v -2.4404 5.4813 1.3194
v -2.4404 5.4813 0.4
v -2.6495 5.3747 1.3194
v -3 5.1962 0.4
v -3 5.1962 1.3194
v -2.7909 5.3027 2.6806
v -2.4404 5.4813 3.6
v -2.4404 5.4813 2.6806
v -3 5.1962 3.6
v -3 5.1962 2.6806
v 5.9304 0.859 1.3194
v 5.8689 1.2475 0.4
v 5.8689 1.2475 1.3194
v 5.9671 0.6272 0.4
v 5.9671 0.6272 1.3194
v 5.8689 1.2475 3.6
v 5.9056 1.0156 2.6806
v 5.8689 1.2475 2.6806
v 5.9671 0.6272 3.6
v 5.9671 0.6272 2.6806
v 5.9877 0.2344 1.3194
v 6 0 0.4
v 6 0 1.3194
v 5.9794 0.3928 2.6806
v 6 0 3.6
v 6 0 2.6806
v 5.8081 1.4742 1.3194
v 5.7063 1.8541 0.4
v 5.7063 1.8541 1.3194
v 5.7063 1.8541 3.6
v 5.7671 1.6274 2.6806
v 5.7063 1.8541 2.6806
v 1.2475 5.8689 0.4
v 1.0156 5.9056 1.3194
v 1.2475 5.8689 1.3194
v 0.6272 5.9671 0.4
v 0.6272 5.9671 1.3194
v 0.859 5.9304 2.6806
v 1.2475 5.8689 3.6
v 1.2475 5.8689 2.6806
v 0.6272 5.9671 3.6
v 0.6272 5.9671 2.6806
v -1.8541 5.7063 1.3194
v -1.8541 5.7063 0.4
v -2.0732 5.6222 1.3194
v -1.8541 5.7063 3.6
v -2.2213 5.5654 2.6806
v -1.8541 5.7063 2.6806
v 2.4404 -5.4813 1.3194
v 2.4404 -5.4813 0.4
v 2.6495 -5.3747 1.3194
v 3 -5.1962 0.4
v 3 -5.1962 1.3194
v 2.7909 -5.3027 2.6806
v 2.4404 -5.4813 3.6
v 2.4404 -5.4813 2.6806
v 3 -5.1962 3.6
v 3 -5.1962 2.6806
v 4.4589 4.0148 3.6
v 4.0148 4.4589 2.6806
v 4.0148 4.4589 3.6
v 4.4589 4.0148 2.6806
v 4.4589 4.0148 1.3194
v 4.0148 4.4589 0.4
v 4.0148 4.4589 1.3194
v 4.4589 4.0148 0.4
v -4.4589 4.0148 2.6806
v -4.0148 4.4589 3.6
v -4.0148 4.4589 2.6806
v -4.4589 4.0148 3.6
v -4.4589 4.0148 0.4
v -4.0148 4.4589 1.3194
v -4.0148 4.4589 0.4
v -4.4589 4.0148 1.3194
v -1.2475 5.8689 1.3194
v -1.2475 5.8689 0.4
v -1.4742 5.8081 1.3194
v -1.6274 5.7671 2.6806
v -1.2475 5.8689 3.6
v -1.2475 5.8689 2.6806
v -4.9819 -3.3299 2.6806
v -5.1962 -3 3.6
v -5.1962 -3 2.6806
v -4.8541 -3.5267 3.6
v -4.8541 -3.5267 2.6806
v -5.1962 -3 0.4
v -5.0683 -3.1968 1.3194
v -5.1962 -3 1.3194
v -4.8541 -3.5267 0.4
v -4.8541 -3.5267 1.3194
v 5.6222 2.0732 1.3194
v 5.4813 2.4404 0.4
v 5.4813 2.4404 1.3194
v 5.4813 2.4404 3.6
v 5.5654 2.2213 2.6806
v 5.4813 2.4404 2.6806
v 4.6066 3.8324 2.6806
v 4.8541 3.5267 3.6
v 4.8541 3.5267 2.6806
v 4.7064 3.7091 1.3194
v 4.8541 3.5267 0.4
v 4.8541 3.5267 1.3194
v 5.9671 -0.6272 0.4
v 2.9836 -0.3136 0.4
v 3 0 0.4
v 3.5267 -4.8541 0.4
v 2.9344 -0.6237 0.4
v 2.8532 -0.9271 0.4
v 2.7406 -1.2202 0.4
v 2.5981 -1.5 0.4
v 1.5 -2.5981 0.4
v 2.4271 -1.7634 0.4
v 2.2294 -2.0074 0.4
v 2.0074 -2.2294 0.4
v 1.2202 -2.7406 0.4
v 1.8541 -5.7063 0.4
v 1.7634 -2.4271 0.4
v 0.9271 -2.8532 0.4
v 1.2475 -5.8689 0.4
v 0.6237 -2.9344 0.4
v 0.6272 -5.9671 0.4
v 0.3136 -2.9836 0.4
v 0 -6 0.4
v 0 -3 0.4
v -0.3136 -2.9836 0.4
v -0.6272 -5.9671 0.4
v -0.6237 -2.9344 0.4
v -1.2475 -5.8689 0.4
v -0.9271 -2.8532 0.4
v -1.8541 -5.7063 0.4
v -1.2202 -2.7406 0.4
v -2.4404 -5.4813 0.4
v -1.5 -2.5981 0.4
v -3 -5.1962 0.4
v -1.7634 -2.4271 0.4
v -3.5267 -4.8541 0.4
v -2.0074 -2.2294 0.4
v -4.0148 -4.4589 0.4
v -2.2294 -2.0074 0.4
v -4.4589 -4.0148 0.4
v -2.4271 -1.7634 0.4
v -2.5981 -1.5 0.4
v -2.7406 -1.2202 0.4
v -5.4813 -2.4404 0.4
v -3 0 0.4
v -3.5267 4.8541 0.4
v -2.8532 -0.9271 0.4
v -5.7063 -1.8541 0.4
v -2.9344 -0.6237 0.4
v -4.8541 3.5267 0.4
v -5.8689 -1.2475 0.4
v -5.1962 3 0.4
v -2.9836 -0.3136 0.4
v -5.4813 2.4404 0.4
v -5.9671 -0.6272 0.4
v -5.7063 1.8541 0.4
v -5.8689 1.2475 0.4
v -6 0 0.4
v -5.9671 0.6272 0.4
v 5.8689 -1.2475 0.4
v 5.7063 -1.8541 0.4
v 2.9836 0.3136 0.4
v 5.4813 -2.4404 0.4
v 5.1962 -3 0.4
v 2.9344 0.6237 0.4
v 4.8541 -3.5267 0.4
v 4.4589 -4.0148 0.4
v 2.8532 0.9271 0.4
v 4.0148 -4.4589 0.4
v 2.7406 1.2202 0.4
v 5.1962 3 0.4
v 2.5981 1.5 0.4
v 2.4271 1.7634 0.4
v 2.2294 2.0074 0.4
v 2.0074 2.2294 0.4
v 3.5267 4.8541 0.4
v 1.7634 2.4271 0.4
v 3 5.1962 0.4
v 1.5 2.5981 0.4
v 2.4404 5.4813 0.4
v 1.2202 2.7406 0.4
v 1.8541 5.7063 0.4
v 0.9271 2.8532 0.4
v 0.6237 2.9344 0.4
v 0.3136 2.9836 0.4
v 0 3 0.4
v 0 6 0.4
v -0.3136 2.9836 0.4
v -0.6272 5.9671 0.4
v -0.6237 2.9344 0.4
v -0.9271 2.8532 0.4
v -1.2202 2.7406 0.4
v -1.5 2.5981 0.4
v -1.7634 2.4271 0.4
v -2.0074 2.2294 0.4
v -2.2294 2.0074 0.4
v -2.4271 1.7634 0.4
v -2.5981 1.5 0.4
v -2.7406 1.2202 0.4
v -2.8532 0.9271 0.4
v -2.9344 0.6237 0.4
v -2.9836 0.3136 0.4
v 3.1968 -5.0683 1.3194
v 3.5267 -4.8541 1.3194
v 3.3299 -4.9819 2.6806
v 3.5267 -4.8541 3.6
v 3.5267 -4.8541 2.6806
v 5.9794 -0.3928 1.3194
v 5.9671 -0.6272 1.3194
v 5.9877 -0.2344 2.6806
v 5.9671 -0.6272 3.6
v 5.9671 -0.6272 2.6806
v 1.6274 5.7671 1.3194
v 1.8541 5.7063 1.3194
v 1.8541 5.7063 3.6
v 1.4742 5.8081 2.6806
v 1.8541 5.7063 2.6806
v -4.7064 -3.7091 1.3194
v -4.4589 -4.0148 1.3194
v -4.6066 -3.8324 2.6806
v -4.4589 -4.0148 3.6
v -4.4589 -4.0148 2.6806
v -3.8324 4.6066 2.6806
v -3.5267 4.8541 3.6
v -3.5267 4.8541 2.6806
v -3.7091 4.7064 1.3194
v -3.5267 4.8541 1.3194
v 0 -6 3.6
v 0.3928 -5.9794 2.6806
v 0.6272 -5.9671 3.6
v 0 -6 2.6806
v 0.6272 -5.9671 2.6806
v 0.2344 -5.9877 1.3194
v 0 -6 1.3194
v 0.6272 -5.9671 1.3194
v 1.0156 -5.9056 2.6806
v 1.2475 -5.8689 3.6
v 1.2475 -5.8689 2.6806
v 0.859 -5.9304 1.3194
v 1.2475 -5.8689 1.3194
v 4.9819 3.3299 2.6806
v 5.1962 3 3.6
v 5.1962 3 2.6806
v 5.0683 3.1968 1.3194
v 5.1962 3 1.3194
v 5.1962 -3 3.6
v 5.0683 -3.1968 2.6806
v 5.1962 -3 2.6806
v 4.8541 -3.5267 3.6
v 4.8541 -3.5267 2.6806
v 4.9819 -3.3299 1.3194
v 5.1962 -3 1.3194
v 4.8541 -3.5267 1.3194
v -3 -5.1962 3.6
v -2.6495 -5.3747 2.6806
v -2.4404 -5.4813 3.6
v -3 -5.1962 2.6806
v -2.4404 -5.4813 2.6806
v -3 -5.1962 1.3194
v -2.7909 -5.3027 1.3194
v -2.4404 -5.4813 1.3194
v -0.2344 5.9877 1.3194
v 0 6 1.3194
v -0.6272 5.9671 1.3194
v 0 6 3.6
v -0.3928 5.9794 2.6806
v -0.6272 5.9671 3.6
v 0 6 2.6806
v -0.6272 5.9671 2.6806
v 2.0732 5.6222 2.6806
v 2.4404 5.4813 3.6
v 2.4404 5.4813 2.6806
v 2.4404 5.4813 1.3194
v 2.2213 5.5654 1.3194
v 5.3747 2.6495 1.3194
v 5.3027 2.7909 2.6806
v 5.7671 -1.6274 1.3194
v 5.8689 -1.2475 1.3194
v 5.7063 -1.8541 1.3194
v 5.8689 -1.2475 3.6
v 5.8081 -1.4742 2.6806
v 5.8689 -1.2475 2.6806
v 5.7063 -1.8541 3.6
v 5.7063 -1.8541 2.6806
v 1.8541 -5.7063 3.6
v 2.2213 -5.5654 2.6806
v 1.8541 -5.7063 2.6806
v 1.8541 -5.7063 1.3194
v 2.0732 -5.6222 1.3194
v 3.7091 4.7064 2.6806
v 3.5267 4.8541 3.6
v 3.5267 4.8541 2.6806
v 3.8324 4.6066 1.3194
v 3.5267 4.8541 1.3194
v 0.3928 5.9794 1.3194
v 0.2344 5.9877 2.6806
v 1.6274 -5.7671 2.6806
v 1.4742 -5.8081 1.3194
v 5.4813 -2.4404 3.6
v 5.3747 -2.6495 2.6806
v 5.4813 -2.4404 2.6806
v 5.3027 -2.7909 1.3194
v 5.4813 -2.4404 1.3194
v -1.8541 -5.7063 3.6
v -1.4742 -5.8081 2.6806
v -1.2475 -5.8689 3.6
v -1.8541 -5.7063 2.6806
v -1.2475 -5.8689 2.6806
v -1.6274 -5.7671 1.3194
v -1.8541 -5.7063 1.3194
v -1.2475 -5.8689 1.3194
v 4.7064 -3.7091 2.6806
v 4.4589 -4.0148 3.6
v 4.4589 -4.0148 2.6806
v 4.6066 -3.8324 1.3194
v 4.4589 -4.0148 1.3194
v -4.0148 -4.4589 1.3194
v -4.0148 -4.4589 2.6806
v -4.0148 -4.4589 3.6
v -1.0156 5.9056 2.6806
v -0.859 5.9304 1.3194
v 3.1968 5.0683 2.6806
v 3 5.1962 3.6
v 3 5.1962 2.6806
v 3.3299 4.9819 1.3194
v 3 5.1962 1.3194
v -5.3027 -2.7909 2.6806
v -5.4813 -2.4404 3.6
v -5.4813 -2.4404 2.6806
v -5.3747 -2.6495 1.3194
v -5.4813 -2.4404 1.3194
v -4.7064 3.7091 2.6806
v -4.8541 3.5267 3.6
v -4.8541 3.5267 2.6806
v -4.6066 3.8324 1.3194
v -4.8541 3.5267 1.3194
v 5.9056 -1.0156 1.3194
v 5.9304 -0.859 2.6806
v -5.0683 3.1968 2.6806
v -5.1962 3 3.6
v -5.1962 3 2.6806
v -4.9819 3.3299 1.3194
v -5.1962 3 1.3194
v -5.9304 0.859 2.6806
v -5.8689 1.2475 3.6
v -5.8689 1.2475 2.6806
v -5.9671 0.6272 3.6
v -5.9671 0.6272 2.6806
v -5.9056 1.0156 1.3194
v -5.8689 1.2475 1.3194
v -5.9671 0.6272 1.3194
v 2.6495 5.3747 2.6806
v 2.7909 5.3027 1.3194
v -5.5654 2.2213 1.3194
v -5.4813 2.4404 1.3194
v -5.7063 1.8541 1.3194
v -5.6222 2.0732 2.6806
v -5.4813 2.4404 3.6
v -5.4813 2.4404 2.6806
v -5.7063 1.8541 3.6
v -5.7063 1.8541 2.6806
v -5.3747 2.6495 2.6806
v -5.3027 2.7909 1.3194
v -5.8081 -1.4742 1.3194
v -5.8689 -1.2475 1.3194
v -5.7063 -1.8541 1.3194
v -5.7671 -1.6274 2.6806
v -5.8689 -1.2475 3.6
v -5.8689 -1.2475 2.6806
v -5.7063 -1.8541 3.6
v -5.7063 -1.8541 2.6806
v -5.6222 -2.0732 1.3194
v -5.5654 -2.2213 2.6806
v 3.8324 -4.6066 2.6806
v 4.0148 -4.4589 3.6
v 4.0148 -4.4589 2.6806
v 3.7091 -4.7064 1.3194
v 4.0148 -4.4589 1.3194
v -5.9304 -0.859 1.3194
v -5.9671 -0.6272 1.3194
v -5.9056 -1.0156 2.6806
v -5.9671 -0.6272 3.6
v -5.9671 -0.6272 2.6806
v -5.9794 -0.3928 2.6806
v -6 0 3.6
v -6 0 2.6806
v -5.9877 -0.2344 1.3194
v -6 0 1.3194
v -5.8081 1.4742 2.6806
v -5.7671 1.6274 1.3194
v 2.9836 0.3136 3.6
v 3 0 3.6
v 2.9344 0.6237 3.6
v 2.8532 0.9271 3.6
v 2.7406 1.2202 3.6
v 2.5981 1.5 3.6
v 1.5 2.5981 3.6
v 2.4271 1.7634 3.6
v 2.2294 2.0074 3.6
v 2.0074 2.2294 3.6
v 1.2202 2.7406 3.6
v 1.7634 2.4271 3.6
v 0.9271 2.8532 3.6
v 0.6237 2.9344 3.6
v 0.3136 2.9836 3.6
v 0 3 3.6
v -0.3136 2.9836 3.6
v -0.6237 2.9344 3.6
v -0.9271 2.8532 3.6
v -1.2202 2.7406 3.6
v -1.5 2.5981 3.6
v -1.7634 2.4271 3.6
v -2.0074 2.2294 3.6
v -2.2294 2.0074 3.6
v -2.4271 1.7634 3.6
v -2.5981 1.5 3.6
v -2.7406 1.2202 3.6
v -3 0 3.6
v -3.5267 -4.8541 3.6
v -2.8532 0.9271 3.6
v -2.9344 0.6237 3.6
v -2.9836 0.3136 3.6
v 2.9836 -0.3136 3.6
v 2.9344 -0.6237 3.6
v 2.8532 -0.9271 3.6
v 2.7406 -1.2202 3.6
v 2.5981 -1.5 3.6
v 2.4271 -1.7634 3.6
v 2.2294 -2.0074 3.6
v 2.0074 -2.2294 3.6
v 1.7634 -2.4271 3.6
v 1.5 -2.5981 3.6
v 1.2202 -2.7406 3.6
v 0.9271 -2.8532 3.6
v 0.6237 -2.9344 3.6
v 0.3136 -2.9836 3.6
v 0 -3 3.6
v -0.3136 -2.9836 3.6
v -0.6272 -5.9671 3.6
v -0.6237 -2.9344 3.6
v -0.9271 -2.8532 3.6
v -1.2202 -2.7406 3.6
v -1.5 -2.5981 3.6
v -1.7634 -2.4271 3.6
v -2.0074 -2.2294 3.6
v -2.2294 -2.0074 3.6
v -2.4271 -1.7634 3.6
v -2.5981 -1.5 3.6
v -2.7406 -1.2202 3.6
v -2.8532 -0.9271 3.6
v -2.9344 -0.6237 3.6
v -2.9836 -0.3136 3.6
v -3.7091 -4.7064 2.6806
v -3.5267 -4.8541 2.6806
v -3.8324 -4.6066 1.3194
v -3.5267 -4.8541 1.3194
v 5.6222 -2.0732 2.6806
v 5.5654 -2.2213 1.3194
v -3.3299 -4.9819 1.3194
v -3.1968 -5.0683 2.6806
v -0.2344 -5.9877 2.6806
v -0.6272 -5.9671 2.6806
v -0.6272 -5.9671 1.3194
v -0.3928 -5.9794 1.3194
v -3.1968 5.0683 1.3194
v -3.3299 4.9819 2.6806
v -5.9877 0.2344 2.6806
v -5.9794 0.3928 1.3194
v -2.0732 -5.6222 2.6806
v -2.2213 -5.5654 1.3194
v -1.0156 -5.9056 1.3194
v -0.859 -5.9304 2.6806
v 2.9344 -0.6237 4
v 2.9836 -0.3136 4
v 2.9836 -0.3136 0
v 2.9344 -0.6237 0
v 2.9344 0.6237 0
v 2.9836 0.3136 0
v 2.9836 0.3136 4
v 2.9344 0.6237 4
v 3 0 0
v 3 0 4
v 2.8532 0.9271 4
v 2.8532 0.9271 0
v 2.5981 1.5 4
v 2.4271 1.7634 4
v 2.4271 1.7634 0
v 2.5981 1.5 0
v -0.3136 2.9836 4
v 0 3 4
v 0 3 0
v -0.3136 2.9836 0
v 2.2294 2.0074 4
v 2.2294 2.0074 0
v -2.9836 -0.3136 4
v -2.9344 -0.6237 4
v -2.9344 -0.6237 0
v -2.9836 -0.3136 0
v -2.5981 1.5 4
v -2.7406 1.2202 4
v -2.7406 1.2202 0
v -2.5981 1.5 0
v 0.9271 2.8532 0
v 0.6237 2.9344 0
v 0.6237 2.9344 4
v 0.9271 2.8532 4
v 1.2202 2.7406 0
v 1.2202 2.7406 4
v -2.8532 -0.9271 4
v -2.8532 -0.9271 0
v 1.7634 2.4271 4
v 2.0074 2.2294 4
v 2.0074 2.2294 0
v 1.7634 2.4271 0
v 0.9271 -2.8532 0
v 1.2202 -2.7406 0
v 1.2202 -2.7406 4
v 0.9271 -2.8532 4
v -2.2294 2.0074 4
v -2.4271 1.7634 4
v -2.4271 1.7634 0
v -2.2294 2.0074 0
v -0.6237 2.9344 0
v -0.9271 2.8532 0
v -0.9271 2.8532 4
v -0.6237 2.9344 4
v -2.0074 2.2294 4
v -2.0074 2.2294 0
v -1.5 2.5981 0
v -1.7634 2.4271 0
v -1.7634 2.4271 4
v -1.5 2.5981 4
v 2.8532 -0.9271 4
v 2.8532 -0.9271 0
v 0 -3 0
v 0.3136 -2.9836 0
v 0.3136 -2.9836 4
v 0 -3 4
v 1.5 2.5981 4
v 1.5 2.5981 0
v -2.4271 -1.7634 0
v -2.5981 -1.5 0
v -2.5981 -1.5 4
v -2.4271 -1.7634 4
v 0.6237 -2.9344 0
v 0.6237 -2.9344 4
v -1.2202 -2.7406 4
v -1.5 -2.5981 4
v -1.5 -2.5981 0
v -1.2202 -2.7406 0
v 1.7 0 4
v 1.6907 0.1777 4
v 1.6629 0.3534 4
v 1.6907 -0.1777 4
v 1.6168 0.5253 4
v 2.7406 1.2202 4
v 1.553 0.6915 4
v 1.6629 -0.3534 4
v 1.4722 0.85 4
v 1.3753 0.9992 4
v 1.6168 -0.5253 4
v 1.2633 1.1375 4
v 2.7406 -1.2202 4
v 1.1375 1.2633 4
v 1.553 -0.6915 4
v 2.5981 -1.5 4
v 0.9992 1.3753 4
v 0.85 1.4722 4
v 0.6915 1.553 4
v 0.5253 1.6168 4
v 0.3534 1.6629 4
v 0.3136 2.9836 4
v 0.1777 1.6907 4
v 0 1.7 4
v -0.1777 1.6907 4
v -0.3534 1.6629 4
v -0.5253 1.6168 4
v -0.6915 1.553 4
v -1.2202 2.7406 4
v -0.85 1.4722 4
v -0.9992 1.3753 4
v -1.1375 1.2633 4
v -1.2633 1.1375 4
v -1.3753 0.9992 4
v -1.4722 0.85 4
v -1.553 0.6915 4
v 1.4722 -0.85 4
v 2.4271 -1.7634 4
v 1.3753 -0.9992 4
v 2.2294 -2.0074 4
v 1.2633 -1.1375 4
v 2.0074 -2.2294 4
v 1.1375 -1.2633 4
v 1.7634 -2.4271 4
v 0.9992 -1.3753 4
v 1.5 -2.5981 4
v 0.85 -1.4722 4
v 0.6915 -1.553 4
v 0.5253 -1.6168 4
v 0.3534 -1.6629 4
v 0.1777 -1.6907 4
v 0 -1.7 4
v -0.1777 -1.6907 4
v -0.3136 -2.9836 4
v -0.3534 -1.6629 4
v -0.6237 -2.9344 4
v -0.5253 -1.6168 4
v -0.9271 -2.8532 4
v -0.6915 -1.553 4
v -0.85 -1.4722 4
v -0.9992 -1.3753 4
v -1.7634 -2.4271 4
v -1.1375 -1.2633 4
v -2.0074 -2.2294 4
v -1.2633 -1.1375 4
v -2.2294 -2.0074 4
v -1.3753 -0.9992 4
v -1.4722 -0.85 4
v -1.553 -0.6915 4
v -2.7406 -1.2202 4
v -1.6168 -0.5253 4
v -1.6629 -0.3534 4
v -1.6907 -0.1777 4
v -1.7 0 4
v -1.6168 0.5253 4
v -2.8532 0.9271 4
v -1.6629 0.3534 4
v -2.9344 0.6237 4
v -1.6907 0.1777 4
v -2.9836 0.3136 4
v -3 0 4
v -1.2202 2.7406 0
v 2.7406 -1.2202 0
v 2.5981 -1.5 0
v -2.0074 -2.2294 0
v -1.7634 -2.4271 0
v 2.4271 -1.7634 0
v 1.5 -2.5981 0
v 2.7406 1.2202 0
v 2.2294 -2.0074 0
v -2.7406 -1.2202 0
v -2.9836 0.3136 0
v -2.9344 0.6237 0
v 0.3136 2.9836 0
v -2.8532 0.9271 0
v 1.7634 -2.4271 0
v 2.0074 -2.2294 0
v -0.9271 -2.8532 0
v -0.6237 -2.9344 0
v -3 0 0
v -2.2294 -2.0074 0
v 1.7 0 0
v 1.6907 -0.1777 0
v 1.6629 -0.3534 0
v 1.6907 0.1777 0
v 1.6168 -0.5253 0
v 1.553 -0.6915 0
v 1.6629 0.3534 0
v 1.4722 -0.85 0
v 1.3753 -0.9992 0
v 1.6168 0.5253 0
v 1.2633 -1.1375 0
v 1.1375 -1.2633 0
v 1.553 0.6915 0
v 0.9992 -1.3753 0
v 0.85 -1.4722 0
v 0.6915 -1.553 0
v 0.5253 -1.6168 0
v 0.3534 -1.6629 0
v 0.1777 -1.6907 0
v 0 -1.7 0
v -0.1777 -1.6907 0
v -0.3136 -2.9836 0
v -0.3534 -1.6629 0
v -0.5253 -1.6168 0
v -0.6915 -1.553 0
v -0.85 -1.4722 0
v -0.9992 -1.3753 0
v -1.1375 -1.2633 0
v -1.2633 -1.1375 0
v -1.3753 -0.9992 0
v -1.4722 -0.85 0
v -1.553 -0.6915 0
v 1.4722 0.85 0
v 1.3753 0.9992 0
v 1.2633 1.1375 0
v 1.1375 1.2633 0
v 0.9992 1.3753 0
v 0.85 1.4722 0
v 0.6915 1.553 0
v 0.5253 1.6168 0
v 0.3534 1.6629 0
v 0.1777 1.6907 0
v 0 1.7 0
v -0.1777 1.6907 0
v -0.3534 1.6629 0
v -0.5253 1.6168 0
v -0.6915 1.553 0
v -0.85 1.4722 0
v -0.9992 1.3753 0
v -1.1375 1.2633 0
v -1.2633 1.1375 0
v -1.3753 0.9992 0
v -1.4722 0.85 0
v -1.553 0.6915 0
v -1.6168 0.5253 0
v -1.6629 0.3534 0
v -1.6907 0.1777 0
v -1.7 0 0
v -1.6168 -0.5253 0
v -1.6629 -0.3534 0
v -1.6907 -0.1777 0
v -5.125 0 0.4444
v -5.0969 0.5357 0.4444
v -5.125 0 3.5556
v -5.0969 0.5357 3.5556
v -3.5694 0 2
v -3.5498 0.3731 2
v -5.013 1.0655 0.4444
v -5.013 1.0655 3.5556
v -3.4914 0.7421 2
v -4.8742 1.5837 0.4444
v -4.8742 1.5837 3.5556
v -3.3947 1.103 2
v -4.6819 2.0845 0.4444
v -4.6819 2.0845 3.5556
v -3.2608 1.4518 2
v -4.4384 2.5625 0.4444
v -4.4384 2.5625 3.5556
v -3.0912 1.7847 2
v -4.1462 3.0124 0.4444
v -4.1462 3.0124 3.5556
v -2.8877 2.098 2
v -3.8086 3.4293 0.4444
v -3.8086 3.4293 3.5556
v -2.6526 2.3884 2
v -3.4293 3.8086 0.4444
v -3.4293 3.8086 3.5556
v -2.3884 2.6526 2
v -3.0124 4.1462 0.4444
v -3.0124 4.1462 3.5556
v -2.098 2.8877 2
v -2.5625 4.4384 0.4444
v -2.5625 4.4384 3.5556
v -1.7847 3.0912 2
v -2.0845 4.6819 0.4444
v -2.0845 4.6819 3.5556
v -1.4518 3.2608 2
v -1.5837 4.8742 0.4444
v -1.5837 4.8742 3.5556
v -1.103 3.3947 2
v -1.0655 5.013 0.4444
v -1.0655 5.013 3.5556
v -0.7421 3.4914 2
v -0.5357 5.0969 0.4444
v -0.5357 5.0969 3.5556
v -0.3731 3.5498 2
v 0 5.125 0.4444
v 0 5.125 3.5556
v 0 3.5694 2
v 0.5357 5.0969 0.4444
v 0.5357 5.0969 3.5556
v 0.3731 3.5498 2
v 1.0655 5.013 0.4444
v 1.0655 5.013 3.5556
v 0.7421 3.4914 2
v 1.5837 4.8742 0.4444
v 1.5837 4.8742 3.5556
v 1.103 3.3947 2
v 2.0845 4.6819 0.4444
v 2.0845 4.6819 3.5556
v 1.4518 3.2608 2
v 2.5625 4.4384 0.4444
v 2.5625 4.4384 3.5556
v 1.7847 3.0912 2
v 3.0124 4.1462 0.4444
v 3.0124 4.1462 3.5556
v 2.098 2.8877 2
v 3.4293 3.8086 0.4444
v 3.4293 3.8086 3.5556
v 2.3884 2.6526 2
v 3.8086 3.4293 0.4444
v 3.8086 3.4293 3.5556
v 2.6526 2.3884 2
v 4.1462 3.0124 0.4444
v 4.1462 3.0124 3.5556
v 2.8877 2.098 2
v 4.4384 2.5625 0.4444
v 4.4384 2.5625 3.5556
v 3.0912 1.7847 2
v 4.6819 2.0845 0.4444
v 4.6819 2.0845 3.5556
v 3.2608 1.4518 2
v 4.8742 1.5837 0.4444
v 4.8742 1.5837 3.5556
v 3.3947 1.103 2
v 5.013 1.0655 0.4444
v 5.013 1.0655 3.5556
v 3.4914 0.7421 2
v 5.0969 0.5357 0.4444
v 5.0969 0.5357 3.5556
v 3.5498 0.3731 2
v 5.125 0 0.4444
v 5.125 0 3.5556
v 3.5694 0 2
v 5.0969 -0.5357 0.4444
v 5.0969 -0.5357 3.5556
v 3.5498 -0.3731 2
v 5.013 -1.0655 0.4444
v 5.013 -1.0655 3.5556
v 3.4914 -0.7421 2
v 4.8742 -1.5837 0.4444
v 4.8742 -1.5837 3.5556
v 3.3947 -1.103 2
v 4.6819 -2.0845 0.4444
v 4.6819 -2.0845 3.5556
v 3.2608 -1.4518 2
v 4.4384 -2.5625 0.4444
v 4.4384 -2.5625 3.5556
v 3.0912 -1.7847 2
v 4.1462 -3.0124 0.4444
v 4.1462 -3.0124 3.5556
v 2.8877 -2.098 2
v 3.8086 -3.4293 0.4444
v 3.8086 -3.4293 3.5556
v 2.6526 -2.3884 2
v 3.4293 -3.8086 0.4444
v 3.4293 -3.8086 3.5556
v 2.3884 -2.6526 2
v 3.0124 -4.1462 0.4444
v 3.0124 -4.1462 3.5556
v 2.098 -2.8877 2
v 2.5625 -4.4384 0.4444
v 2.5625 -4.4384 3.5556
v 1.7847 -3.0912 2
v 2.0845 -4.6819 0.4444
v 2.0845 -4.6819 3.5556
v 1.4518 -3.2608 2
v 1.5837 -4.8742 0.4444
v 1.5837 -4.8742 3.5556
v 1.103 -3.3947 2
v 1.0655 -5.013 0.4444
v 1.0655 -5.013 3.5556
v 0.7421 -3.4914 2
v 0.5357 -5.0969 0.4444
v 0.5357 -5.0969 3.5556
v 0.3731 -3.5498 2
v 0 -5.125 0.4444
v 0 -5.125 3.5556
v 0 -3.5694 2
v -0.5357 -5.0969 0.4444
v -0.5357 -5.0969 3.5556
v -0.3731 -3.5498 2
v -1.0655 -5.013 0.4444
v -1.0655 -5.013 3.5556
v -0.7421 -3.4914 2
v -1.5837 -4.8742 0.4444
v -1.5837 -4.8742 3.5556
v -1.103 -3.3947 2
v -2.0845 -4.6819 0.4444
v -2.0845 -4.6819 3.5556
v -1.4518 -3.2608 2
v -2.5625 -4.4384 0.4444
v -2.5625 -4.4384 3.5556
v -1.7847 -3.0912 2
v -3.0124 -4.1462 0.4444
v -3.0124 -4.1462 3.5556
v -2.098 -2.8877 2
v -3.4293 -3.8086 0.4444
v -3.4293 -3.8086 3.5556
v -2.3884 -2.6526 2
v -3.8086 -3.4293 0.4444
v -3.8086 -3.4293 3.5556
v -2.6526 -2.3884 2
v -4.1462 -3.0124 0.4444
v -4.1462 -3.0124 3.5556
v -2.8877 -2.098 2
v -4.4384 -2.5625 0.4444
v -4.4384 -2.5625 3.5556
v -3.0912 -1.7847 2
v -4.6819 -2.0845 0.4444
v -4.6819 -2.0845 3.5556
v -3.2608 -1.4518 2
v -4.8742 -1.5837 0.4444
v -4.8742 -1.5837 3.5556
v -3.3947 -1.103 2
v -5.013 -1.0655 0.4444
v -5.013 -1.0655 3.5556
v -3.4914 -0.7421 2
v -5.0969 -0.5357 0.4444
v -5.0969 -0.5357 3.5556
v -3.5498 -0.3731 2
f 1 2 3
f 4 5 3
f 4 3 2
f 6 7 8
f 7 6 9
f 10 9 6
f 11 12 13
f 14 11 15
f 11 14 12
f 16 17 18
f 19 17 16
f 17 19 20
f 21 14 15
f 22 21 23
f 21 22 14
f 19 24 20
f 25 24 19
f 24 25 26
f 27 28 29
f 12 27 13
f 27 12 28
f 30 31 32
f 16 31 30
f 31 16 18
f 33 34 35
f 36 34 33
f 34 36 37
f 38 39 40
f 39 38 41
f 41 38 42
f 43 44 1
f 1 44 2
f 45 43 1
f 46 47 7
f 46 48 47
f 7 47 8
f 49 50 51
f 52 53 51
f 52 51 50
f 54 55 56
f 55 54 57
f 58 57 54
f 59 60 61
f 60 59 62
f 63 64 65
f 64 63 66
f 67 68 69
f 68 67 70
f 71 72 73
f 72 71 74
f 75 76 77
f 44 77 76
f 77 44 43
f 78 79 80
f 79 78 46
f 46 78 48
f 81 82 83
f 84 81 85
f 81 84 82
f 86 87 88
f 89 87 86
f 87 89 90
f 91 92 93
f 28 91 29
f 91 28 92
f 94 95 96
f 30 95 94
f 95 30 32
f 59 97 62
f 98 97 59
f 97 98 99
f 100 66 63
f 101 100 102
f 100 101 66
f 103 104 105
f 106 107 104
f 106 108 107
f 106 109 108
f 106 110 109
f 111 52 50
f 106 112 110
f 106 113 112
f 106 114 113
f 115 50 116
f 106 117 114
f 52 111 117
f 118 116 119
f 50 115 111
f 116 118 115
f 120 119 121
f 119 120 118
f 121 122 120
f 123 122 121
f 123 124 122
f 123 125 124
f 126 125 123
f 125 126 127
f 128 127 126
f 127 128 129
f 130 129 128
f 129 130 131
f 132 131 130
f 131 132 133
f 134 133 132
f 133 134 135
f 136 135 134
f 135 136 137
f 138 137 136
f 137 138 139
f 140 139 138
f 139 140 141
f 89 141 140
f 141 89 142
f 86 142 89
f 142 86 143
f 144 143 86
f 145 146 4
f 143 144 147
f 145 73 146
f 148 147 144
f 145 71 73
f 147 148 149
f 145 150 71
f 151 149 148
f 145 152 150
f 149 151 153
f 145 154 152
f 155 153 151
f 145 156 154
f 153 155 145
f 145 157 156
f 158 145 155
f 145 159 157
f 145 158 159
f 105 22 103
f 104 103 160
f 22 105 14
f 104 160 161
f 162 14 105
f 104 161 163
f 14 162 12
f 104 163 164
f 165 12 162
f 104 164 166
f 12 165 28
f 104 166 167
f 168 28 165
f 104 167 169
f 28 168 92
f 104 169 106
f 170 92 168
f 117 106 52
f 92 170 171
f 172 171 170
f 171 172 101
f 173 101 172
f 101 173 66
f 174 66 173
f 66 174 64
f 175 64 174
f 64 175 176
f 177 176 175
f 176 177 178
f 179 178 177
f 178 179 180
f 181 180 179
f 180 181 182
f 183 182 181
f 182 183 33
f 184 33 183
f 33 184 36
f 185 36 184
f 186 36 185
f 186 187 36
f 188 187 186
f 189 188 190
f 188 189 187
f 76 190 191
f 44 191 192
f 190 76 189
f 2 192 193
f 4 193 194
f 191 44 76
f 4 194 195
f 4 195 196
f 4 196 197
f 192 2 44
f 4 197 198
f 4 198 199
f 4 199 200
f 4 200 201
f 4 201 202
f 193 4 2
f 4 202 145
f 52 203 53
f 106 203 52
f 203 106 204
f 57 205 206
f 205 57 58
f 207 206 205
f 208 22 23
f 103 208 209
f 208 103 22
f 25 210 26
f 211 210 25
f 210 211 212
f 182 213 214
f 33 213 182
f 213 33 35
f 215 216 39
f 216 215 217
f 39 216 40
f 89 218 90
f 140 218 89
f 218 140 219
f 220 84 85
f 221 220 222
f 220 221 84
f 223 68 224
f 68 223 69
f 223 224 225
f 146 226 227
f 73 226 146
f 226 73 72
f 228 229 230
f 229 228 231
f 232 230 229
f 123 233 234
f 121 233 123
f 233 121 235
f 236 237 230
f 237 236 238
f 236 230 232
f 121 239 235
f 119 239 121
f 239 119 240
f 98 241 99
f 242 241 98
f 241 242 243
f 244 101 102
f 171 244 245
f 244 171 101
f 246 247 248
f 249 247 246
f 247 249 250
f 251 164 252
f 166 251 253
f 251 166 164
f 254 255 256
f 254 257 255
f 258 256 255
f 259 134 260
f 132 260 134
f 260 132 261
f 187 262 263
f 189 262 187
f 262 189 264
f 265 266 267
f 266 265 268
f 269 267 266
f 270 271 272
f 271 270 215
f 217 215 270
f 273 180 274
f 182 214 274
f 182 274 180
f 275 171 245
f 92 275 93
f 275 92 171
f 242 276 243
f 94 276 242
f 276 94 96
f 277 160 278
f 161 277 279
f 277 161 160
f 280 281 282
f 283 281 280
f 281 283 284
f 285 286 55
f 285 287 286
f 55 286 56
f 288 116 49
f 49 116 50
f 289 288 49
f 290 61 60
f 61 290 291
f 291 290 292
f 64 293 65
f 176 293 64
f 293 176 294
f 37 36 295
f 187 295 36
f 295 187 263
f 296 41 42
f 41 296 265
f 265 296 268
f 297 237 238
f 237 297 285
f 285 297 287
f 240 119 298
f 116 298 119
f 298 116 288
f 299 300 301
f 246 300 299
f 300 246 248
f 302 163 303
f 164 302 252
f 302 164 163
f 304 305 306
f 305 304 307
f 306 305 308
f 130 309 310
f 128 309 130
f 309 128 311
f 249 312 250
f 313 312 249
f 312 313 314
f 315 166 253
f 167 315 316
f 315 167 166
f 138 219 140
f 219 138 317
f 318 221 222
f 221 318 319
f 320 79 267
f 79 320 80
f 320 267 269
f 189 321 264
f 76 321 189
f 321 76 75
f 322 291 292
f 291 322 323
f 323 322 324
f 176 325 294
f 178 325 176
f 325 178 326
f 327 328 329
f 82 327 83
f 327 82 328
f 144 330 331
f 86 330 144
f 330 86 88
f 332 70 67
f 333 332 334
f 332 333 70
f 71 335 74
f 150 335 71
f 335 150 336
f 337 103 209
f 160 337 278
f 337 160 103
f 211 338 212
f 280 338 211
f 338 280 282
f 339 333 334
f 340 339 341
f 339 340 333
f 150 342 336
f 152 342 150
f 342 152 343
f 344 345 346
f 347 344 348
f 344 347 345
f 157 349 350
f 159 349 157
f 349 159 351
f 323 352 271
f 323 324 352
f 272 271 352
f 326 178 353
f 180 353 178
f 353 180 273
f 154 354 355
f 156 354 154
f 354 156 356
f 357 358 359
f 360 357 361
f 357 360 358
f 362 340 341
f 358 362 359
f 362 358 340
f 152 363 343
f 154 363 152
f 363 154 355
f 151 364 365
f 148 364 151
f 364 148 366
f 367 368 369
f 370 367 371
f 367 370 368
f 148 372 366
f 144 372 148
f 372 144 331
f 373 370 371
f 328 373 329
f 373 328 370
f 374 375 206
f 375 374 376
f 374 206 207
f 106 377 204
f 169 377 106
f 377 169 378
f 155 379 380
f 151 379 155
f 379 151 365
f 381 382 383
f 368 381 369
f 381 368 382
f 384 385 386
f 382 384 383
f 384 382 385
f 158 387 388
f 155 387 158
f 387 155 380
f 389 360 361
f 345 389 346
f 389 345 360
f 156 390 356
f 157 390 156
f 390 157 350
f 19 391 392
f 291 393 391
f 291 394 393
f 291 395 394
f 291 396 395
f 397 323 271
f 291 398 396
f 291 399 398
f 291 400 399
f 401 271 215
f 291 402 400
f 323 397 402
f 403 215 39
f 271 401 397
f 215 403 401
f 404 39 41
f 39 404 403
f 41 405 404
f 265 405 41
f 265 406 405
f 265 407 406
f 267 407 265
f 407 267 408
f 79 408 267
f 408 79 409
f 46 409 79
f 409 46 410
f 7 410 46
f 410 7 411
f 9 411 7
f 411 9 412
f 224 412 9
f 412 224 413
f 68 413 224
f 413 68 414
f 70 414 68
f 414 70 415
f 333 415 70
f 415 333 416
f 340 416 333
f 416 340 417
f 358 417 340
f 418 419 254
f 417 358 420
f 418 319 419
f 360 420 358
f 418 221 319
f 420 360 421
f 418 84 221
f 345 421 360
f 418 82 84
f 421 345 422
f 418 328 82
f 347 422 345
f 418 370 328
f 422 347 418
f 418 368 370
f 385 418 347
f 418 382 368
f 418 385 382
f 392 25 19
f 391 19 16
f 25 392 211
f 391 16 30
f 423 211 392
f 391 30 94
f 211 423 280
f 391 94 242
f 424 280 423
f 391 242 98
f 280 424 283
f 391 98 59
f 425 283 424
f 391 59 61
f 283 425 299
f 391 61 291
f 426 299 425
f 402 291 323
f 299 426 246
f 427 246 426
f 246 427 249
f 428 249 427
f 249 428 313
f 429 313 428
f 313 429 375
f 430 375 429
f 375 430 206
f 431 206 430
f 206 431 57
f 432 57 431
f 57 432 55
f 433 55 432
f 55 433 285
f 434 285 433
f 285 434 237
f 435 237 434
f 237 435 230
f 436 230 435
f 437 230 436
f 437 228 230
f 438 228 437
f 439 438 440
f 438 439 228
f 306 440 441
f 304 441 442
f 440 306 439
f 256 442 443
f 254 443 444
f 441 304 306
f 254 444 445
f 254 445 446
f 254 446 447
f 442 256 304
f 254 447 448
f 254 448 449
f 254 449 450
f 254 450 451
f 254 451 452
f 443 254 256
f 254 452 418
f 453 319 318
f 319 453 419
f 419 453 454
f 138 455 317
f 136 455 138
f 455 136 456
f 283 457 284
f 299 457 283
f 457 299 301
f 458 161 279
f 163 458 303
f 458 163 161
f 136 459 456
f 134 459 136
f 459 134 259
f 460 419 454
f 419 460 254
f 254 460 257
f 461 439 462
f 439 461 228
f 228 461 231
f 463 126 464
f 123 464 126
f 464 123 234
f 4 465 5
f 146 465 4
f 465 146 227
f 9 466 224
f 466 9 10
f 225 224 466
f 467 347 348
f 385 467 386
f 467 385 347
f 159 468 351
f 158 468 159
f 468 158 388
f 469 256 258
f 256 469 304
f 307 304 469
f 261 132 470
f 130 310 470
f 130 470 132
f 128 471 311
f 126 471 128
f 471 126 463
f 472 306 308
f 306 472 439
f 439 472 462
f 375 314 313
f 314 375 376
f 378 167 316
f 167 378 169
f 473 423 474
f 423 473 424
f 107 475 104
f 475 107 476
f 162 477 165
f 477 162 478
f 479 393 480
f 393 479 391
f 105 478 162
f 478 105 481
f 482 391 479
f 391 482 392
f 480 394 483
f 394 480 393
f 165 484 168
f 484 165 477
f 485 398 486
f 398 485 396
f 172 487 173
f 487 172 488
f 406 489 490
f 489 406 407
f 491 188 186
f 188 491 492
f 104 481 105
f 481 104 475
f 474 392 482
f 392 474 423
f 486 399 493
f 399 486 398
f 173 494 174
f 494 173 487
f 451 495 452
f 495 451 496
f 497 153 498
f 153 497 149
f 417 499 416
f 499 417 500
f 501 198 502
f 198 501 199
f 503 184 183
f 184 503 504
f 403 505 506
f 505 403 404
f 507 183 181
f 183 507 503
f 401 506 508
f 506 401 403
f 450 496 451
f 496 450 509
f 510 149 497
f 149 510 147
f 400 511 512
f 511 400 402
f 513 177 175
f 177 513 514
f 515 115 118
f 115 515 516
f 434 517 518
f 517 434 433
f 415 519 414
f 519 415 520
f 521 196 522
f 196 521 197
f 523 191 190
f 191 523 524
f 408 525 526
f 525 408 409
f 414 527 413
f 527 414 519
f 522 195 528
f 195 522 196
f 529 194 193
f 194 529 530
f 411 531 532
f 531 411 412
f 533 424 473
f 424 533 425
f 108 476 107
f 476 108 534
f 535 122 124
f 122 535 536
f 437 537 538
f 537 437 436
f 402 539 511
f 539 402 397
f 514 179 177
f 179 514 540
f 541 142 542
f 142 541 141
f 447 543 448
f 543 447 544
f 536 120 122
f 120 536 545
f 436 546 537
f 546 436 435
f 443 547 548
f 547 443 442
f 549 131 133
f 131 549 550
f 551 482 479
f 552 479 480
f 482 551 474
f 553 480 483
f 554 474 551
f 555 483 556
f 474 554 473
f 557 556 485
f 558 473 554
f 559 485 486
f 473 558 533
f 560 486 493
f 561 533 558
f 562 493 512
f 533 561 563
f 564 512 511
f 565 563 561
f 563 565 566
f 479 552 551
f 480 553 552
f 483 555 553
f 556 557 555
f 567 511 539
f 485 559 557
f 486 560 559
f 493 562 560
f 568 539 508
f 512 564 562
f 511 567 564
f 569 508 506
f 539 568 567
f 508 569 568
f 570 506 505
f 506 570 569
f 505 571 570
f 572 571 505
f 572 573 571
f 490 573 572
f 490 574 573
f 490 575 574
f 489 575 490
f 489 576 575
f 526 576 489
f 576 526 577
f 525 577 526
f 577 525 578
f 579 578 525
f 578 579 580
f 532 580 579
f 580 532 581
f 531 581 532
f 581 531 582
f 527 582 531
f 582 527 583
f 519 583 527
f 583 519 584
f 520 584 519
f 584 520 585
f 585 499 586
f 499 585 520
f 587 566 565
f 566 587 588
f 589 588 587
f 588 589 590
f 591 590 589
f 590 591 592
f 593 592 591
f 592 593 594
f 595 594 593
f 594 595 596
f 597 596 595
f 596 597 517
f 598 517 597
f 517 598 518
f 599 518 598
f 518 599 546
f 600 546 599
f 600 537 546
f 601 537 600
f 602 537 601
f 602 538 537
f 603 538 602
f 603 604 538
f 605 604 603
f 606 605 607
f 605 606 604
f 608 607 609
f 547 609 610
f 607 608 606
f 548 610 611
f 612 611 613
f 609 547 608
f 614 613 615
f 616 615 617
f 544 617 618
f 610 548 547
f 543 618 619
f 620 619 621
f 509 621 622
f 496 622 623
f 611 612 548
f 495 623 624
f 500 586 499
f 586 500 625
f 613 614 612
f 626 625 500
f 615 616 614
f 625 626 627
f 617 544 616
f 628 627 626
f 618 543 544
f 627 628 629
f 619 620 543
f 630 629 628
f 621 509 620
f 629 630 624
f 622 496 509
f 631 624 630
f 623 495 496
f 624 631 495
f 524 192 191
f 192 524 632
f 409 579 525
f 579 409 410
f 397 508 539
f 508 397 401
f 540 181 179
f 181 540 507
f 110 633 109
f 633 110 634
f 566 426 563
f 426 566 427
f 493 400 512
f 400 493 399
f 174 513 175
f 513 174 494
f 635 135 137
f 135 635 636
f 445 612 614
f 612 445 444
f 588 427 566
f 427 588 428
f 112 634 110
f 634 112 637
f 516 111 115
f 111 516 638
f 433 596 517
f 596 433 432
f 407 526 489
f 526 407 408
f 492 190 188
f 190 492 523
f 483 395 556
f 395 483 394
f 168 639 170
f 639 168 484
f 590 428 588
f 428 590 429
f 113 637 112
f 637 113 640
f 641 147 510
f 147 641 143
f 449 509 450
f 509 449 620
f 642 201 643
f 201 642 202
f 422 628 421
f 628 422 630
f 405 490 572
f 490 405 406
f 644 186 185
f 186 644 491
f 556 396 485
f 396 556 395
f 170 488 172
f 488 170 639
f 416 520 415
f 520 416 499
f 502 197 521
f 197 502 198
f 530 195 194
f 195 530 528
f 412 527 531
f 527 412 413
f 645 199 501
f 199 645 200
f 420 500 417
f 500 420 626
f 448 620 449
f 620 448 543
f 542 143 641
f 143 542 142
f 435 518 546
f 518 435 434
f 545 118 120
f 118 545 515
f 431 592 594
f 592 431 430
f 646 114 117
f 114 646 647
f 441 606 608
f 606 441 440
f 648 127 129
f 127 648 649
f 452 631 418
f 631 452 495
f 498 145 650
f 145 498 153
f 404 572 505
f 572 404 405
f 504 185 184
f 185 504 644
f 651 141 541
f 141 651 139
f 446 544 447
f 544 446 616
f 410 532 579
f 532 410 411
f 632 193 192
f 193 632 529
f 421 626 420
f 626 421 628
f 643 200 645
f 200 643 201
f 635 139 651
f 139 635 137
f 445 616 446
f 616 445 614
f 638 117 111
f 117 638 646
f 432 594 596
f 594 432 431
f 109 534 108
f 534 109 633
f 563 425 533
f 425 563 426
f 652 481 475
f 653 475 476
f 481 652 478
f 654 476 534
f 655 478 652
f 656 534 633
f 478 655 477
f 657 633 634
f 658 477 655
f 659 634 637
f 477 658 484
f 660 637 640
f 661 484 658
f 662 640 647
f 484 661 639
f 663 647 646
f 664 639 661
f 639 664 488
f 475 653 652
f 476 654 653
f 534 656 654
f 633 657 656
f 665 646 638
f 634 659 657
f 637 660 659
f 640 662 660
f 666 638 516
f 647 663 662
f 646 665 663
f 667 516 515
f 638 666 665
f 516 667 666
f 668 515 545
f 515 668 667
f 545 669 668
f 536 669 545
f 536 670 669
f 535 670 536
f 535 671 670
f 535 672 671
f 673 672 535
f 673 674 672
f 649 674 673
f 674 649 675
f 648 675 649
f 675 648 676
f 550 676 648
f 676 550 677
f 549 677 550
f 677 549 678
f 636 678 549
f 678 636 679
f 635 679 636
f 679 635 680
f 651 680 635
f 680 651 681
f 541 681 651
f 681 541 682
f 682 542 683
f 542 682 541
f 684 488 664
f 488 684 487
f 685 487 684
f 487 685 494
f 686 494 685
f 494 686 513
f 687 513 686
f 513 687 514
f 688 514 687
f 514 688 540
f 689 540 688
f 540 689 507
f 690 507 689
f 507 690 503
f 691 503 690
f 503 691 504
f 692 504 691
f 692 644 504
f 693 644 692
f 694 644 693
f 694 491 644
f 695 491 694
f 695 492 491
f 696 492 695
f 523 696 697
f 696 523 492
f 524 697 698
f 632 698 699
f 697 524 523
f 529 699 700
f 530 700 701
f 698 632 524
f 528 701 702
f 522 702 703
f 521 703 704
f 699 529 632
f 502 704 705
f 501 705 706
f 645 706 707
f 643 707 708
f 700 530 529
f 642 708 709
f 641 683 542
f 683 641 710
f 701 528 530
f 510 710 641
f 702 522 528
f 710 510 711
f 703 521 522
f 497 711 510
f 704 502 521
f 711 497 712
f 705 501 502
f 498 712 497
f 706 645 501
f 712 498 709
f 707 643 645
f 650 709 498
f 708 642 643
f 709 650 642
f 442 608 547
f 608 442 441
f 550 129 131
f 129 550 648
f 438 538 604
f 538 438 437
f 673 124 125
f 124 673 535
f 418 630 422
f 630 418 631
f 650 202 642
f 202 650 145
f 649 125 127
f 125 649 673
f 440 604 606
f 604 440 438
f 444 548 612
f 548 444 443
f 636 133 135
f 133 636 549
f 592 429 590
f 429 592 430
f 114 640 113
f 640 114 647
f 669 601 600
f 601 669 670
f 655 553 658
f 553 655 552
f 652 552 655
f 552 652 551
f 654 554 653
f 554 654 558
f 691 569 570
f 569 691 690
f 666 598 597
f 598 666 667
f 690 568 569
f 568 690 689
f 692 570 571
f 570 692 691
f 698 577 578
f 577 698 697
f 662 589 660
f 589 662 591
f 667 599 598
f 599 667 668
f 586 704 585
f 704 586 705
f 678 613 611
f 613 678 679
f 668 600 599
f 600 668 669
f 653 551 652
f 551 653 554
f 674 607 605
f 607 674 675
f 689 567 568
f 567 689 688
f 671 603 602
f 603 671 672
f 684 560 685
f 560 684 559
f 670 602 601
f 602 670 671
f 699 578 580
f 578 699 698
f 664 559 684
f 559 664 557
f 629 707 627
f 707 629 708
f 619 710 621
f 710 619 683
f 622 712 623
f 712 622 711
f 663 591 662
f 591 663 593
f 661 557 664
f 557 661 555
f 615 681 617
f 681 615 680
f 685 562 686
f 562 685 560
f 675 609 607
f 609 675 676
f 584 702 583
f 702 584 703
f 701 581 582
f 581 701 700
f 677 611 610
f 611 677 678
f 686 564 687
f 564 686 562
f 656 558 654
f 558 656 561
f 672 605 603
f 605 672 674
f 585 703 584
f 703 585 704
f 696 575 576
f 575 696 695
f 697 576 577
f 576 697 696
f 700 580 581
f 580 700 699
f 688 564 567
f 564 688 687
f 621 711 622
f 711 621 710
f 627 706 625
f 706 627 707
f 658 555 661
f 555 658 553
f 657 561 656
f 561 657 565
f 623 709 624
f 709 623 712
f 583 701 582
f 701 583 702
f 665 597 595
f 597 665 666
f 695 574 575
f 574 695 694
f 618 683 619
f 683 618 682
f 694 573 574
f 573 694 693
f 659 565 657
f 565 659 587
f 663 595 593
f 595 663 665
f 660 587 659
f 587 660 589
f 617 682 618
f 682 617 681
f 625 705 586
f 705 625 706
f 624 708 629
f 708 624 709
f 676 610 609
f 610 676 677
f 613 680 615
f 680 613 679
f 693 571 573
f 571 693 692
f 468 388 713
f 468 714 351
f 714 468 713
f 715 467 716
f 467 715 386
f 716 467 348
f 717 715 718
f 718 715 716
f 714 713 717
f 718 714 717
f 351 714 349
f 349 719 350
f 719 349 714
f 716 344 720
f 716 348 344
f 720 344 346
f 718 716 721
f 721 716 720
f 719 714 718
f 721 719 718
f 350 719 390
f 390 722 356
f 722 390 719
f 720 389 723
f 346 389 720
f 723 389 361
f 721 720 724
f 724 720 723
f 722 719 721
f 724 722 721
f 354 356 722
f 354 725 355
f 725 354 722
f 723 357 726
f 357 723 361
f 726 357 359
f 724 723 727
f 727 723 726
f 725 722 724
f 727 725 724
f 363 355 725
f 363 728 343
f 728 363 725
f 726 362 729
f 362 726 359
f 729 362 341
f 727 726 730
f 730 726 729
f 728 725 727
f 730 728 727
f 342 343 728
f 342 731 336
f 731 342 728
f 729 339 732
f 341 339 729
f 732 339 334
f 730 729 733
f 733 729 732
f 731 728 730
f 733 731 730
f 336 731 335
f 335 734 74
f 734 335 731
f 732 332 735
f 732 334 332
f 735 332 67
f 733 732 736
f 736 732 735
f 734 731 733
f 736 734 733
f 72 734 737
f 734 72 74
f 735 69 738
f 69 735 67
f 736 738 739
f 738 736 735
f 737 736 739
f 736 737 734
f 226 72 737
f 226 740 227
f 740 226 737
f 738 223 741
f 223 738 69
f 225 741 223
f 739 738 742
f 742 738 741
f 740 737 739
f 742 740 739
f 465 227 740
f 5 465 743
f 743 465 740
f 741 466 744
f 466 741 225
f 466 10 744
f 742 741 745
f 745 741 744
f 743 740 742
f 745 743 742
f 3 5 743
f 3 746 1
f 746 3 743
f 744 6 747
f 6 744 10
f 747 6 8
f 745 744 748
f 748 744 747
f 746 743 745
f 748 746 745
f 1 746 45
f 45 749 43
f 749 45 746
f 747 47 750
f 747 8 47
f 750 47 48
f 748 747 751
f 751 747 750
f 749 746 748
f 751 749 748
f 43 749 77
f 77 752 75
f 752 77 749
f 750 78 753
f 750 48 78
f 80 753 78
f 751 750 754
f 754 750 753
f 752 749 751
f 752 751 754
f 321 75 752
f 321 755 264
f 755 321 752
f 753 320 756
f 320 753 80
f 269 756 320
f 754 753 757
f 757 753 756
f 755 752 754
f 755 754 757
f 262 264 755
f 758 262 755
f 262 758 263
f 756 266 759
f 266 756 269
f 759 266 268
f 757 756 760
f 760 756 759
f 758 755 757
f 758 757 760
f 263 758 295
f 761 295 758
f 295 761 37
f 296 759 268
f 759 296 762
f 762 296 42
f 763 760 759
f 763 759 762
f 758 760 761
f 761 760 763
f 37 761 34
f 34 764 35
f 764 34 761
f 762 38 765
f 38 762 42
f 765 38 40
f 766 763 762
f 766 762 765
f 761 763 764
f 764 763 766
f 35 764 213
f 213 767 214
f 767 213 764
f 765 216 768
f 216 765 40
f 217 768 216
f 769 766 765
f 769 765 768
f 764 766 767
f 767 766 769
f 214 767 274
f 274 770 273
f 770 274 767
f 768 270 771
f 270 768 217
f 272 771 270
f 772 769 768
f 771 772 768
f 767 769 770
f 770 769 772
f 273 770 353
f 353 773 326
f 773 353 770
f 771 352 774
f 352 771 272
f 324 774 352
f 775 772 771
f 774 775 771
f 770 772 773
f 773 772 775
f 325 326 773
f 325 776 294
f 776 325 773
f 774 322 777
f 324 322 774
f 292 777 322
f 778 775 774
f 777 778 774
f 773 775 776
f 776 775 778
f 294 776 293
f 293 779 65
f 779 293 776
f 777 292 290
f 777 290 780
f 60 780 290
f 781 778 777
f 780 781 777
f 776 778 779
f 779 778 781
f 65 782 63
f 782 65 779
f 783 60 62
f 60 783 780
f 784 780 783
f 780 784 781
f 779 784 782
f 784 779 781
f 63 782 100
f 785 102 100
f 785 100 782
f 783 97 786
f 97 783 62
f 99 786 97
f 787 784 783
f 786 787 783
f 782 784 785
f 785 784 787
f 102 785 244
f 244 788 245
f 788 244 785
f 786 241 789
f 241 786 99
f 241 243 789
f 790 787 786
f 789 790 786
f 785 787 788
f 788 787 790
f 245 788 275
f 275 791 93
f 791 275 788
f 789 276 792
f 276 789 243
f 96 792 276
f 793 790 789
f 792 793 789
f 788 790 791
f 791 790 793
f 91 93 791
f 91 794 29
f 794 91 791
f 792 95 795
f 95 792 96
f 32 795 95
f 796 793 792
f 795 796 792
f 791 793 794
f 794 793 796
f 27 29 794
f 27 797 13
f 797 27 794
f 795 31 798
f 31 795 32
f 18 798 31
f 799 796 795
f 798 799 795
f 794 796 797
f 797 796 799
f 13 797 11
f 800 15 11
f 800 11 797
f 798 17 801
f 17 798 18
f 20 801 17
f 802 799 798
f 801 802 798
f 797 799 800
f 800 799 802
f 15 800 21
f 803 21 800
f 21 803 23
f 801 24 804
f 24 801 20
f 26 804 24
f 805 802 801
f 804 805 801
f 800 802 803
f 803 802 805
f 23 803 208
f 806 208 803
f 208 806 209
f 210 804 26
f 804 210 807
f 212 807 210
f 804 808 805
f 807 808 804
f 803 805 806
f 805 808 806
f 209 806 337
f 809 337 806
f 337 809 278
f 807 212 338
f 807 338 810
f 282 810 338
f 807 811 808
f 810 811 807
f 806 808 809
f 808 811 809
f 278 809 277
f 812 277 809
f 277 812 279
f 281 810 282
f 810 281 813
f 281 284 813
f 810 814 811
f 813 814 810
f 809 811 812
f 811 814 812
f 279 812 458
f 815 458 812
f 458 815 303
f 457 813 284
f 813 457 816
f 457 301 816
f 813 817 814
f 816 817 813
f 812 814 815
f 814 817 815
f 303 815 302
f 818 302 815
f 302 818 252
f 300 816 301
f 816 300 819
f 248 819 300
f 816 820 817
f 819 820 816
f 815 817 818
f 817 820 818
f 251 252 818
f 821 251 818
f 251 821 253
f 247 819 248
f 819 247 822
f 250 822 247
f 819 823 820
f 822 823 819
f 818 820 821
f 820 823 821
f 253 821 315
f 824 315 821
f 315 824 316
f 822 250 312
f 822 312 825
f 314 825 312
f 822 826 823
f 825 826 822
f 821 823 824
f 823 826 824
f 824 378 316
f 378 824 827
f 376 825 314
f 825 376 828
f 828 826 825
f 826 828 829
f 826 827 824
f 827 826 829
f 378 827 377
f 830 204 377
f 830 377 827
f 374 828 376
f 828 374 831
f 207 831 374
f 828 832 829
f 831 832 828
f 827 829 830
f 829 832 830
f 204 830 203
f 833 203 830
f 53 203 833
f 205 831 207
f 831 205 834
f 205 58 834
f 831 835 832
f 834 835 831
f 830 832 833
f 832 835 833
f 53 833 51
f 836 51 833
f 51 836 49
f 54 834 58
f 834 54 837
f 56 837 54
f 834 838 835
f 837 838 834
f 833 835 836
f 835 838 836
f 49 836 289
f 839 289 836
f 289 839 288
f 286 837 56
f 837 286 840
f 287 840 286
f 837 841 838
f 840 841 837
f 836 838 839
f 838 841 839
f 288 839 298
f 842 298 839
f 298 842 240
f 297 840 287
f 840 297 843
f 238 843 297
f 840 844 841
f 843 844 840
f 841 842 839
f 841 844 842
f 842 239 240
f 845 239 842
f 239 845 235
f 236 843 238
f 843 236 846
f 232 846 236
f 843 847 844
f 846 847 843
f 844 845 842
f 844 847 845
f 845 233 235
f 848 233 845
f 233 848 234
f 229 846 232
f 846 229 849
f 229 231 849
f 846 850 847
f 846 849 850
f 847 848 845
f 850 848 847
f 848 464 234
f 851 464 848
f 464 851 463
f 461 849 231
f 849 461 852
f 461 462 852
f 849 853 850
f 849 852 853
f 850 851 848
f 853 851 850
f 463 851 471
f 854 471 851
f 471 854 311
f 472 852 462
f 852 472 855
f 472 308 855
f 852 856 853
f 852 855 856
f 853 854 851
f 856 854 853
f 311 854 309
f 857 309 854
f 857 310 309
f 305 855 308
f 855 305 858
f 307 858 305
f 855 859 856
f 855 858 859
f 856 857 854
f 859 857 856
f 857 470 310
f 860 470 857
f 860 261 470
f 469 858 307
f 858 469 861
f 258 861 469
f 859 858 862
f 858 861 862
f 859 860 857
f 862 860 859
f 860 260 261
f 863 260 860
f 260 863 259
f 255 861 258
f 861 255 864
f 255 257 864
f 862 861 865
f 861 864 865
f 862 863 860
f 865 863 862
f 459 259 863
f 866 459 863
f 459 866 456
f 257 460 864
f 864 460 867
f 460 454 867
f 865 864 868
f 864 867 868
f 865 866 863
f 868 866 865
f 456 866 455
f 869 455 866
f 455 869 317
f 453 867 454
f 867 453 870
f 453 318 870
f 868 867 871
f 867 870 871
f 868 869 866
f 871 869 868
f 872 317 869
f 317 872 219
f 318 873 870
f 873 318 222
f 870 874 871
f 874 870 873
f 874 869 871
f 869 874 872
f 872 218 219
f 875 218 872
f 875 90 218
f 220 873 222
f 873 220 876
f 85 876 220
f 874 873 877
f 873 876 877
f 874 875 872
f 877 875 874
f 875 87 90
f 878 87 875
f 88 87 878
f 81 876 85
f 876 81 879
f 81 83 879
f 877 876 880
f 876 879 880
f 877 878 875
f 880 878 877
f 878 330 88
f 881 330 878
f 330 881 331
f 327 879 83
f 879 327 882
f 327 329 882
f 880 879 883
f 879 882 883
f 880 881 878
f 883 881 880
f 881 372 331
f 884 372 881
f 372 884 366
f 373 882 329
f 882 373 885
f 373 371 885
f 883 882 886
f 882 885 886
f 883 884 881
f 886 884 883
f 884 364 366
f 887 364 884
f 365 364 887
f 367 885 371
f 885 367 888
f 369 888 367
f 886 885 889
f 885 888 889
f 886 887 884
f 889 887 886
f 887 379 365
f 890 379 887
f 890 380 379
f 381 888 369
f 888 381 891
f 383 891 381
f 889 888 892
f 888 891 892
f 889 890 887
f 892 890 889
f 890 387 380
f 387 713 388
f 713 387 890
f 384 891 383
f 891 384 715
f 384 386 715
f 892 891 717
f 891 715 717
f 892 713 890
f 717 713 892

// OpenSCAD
// ====================================================================
// Trolley Roller Wheel (100% 3D-Printable - Flat on Bed at Z = 0)
// Grooved sheave designed to roll directly on a 1.0 - 2.0 mm cable line.
// Spins freely on a standard M3 or M4 screw / pin axle.
// ====================================================================

$fn = 60; // Smooth curve resolution

// Parameters - Enlarged & Print-Optimized (Robust 3D Printing)
wheel_outer_dia   = 12.0; // Outer flange diameter (mm)
groove_root_dia   = 8.5;  // Bottom of groove diameter (mm) - solid wall around bore!
wheel_thickness   = 3.2;  // Total thickness along axle (mm)
groove_width      = 2.0;  // Cable track width (mm)
axle_hole_dia     = 3.4;  // Fits standard M3 screw / 3D-printed 3.2mm axle pin
hub_lip_extension = 0.4;  // Built-in standoff hub so wheel faces don't rub
hub_dia           = 6.0;  // Diameter of built-in standoff spacer


total_wheel_h = wheel_thickness + (hub_lip_extension * 2);

module trolley_wheel_body(od = wheel_outer_dia, root_d = groove_root_dia, th = wheel_thickness, axle_d = axle_hole_dia) {
    difference() {
        union() {
            // Main wheel body
            translate([0, 0, hub_lip_extension])
                cylinder(d = od, h = th);
            // Built-in hub spacers on both sides (starts at Z = 0)
            cylinder(d = hub_dia, h = th + (hub_lip_extension * 2));
        }
        
        // Central axle bore
        translate([0, 0, -1])
            cylinder(d = axle_d, h = th + (hub_lip_extension * 2) + 2);
        
        // Deep V/U Cable groove around the perimeter
        translate([0, 0, (th / 2) + hub_lip_extension])
            rotate_extrude(convexity = 10) {
                translate([root_d / 2 + (od - root_d) / 4, 0, 0])
                    rotate([0, 0, 45])
                        square([groove_width * 1.1, groove_width * 1.1], center = true);
            }
    }
}

module trolley_wheel() {
    trolley_wheel_body();
}

// Render single wheel flat on build plate at Z = 0
trolley_wheel();
